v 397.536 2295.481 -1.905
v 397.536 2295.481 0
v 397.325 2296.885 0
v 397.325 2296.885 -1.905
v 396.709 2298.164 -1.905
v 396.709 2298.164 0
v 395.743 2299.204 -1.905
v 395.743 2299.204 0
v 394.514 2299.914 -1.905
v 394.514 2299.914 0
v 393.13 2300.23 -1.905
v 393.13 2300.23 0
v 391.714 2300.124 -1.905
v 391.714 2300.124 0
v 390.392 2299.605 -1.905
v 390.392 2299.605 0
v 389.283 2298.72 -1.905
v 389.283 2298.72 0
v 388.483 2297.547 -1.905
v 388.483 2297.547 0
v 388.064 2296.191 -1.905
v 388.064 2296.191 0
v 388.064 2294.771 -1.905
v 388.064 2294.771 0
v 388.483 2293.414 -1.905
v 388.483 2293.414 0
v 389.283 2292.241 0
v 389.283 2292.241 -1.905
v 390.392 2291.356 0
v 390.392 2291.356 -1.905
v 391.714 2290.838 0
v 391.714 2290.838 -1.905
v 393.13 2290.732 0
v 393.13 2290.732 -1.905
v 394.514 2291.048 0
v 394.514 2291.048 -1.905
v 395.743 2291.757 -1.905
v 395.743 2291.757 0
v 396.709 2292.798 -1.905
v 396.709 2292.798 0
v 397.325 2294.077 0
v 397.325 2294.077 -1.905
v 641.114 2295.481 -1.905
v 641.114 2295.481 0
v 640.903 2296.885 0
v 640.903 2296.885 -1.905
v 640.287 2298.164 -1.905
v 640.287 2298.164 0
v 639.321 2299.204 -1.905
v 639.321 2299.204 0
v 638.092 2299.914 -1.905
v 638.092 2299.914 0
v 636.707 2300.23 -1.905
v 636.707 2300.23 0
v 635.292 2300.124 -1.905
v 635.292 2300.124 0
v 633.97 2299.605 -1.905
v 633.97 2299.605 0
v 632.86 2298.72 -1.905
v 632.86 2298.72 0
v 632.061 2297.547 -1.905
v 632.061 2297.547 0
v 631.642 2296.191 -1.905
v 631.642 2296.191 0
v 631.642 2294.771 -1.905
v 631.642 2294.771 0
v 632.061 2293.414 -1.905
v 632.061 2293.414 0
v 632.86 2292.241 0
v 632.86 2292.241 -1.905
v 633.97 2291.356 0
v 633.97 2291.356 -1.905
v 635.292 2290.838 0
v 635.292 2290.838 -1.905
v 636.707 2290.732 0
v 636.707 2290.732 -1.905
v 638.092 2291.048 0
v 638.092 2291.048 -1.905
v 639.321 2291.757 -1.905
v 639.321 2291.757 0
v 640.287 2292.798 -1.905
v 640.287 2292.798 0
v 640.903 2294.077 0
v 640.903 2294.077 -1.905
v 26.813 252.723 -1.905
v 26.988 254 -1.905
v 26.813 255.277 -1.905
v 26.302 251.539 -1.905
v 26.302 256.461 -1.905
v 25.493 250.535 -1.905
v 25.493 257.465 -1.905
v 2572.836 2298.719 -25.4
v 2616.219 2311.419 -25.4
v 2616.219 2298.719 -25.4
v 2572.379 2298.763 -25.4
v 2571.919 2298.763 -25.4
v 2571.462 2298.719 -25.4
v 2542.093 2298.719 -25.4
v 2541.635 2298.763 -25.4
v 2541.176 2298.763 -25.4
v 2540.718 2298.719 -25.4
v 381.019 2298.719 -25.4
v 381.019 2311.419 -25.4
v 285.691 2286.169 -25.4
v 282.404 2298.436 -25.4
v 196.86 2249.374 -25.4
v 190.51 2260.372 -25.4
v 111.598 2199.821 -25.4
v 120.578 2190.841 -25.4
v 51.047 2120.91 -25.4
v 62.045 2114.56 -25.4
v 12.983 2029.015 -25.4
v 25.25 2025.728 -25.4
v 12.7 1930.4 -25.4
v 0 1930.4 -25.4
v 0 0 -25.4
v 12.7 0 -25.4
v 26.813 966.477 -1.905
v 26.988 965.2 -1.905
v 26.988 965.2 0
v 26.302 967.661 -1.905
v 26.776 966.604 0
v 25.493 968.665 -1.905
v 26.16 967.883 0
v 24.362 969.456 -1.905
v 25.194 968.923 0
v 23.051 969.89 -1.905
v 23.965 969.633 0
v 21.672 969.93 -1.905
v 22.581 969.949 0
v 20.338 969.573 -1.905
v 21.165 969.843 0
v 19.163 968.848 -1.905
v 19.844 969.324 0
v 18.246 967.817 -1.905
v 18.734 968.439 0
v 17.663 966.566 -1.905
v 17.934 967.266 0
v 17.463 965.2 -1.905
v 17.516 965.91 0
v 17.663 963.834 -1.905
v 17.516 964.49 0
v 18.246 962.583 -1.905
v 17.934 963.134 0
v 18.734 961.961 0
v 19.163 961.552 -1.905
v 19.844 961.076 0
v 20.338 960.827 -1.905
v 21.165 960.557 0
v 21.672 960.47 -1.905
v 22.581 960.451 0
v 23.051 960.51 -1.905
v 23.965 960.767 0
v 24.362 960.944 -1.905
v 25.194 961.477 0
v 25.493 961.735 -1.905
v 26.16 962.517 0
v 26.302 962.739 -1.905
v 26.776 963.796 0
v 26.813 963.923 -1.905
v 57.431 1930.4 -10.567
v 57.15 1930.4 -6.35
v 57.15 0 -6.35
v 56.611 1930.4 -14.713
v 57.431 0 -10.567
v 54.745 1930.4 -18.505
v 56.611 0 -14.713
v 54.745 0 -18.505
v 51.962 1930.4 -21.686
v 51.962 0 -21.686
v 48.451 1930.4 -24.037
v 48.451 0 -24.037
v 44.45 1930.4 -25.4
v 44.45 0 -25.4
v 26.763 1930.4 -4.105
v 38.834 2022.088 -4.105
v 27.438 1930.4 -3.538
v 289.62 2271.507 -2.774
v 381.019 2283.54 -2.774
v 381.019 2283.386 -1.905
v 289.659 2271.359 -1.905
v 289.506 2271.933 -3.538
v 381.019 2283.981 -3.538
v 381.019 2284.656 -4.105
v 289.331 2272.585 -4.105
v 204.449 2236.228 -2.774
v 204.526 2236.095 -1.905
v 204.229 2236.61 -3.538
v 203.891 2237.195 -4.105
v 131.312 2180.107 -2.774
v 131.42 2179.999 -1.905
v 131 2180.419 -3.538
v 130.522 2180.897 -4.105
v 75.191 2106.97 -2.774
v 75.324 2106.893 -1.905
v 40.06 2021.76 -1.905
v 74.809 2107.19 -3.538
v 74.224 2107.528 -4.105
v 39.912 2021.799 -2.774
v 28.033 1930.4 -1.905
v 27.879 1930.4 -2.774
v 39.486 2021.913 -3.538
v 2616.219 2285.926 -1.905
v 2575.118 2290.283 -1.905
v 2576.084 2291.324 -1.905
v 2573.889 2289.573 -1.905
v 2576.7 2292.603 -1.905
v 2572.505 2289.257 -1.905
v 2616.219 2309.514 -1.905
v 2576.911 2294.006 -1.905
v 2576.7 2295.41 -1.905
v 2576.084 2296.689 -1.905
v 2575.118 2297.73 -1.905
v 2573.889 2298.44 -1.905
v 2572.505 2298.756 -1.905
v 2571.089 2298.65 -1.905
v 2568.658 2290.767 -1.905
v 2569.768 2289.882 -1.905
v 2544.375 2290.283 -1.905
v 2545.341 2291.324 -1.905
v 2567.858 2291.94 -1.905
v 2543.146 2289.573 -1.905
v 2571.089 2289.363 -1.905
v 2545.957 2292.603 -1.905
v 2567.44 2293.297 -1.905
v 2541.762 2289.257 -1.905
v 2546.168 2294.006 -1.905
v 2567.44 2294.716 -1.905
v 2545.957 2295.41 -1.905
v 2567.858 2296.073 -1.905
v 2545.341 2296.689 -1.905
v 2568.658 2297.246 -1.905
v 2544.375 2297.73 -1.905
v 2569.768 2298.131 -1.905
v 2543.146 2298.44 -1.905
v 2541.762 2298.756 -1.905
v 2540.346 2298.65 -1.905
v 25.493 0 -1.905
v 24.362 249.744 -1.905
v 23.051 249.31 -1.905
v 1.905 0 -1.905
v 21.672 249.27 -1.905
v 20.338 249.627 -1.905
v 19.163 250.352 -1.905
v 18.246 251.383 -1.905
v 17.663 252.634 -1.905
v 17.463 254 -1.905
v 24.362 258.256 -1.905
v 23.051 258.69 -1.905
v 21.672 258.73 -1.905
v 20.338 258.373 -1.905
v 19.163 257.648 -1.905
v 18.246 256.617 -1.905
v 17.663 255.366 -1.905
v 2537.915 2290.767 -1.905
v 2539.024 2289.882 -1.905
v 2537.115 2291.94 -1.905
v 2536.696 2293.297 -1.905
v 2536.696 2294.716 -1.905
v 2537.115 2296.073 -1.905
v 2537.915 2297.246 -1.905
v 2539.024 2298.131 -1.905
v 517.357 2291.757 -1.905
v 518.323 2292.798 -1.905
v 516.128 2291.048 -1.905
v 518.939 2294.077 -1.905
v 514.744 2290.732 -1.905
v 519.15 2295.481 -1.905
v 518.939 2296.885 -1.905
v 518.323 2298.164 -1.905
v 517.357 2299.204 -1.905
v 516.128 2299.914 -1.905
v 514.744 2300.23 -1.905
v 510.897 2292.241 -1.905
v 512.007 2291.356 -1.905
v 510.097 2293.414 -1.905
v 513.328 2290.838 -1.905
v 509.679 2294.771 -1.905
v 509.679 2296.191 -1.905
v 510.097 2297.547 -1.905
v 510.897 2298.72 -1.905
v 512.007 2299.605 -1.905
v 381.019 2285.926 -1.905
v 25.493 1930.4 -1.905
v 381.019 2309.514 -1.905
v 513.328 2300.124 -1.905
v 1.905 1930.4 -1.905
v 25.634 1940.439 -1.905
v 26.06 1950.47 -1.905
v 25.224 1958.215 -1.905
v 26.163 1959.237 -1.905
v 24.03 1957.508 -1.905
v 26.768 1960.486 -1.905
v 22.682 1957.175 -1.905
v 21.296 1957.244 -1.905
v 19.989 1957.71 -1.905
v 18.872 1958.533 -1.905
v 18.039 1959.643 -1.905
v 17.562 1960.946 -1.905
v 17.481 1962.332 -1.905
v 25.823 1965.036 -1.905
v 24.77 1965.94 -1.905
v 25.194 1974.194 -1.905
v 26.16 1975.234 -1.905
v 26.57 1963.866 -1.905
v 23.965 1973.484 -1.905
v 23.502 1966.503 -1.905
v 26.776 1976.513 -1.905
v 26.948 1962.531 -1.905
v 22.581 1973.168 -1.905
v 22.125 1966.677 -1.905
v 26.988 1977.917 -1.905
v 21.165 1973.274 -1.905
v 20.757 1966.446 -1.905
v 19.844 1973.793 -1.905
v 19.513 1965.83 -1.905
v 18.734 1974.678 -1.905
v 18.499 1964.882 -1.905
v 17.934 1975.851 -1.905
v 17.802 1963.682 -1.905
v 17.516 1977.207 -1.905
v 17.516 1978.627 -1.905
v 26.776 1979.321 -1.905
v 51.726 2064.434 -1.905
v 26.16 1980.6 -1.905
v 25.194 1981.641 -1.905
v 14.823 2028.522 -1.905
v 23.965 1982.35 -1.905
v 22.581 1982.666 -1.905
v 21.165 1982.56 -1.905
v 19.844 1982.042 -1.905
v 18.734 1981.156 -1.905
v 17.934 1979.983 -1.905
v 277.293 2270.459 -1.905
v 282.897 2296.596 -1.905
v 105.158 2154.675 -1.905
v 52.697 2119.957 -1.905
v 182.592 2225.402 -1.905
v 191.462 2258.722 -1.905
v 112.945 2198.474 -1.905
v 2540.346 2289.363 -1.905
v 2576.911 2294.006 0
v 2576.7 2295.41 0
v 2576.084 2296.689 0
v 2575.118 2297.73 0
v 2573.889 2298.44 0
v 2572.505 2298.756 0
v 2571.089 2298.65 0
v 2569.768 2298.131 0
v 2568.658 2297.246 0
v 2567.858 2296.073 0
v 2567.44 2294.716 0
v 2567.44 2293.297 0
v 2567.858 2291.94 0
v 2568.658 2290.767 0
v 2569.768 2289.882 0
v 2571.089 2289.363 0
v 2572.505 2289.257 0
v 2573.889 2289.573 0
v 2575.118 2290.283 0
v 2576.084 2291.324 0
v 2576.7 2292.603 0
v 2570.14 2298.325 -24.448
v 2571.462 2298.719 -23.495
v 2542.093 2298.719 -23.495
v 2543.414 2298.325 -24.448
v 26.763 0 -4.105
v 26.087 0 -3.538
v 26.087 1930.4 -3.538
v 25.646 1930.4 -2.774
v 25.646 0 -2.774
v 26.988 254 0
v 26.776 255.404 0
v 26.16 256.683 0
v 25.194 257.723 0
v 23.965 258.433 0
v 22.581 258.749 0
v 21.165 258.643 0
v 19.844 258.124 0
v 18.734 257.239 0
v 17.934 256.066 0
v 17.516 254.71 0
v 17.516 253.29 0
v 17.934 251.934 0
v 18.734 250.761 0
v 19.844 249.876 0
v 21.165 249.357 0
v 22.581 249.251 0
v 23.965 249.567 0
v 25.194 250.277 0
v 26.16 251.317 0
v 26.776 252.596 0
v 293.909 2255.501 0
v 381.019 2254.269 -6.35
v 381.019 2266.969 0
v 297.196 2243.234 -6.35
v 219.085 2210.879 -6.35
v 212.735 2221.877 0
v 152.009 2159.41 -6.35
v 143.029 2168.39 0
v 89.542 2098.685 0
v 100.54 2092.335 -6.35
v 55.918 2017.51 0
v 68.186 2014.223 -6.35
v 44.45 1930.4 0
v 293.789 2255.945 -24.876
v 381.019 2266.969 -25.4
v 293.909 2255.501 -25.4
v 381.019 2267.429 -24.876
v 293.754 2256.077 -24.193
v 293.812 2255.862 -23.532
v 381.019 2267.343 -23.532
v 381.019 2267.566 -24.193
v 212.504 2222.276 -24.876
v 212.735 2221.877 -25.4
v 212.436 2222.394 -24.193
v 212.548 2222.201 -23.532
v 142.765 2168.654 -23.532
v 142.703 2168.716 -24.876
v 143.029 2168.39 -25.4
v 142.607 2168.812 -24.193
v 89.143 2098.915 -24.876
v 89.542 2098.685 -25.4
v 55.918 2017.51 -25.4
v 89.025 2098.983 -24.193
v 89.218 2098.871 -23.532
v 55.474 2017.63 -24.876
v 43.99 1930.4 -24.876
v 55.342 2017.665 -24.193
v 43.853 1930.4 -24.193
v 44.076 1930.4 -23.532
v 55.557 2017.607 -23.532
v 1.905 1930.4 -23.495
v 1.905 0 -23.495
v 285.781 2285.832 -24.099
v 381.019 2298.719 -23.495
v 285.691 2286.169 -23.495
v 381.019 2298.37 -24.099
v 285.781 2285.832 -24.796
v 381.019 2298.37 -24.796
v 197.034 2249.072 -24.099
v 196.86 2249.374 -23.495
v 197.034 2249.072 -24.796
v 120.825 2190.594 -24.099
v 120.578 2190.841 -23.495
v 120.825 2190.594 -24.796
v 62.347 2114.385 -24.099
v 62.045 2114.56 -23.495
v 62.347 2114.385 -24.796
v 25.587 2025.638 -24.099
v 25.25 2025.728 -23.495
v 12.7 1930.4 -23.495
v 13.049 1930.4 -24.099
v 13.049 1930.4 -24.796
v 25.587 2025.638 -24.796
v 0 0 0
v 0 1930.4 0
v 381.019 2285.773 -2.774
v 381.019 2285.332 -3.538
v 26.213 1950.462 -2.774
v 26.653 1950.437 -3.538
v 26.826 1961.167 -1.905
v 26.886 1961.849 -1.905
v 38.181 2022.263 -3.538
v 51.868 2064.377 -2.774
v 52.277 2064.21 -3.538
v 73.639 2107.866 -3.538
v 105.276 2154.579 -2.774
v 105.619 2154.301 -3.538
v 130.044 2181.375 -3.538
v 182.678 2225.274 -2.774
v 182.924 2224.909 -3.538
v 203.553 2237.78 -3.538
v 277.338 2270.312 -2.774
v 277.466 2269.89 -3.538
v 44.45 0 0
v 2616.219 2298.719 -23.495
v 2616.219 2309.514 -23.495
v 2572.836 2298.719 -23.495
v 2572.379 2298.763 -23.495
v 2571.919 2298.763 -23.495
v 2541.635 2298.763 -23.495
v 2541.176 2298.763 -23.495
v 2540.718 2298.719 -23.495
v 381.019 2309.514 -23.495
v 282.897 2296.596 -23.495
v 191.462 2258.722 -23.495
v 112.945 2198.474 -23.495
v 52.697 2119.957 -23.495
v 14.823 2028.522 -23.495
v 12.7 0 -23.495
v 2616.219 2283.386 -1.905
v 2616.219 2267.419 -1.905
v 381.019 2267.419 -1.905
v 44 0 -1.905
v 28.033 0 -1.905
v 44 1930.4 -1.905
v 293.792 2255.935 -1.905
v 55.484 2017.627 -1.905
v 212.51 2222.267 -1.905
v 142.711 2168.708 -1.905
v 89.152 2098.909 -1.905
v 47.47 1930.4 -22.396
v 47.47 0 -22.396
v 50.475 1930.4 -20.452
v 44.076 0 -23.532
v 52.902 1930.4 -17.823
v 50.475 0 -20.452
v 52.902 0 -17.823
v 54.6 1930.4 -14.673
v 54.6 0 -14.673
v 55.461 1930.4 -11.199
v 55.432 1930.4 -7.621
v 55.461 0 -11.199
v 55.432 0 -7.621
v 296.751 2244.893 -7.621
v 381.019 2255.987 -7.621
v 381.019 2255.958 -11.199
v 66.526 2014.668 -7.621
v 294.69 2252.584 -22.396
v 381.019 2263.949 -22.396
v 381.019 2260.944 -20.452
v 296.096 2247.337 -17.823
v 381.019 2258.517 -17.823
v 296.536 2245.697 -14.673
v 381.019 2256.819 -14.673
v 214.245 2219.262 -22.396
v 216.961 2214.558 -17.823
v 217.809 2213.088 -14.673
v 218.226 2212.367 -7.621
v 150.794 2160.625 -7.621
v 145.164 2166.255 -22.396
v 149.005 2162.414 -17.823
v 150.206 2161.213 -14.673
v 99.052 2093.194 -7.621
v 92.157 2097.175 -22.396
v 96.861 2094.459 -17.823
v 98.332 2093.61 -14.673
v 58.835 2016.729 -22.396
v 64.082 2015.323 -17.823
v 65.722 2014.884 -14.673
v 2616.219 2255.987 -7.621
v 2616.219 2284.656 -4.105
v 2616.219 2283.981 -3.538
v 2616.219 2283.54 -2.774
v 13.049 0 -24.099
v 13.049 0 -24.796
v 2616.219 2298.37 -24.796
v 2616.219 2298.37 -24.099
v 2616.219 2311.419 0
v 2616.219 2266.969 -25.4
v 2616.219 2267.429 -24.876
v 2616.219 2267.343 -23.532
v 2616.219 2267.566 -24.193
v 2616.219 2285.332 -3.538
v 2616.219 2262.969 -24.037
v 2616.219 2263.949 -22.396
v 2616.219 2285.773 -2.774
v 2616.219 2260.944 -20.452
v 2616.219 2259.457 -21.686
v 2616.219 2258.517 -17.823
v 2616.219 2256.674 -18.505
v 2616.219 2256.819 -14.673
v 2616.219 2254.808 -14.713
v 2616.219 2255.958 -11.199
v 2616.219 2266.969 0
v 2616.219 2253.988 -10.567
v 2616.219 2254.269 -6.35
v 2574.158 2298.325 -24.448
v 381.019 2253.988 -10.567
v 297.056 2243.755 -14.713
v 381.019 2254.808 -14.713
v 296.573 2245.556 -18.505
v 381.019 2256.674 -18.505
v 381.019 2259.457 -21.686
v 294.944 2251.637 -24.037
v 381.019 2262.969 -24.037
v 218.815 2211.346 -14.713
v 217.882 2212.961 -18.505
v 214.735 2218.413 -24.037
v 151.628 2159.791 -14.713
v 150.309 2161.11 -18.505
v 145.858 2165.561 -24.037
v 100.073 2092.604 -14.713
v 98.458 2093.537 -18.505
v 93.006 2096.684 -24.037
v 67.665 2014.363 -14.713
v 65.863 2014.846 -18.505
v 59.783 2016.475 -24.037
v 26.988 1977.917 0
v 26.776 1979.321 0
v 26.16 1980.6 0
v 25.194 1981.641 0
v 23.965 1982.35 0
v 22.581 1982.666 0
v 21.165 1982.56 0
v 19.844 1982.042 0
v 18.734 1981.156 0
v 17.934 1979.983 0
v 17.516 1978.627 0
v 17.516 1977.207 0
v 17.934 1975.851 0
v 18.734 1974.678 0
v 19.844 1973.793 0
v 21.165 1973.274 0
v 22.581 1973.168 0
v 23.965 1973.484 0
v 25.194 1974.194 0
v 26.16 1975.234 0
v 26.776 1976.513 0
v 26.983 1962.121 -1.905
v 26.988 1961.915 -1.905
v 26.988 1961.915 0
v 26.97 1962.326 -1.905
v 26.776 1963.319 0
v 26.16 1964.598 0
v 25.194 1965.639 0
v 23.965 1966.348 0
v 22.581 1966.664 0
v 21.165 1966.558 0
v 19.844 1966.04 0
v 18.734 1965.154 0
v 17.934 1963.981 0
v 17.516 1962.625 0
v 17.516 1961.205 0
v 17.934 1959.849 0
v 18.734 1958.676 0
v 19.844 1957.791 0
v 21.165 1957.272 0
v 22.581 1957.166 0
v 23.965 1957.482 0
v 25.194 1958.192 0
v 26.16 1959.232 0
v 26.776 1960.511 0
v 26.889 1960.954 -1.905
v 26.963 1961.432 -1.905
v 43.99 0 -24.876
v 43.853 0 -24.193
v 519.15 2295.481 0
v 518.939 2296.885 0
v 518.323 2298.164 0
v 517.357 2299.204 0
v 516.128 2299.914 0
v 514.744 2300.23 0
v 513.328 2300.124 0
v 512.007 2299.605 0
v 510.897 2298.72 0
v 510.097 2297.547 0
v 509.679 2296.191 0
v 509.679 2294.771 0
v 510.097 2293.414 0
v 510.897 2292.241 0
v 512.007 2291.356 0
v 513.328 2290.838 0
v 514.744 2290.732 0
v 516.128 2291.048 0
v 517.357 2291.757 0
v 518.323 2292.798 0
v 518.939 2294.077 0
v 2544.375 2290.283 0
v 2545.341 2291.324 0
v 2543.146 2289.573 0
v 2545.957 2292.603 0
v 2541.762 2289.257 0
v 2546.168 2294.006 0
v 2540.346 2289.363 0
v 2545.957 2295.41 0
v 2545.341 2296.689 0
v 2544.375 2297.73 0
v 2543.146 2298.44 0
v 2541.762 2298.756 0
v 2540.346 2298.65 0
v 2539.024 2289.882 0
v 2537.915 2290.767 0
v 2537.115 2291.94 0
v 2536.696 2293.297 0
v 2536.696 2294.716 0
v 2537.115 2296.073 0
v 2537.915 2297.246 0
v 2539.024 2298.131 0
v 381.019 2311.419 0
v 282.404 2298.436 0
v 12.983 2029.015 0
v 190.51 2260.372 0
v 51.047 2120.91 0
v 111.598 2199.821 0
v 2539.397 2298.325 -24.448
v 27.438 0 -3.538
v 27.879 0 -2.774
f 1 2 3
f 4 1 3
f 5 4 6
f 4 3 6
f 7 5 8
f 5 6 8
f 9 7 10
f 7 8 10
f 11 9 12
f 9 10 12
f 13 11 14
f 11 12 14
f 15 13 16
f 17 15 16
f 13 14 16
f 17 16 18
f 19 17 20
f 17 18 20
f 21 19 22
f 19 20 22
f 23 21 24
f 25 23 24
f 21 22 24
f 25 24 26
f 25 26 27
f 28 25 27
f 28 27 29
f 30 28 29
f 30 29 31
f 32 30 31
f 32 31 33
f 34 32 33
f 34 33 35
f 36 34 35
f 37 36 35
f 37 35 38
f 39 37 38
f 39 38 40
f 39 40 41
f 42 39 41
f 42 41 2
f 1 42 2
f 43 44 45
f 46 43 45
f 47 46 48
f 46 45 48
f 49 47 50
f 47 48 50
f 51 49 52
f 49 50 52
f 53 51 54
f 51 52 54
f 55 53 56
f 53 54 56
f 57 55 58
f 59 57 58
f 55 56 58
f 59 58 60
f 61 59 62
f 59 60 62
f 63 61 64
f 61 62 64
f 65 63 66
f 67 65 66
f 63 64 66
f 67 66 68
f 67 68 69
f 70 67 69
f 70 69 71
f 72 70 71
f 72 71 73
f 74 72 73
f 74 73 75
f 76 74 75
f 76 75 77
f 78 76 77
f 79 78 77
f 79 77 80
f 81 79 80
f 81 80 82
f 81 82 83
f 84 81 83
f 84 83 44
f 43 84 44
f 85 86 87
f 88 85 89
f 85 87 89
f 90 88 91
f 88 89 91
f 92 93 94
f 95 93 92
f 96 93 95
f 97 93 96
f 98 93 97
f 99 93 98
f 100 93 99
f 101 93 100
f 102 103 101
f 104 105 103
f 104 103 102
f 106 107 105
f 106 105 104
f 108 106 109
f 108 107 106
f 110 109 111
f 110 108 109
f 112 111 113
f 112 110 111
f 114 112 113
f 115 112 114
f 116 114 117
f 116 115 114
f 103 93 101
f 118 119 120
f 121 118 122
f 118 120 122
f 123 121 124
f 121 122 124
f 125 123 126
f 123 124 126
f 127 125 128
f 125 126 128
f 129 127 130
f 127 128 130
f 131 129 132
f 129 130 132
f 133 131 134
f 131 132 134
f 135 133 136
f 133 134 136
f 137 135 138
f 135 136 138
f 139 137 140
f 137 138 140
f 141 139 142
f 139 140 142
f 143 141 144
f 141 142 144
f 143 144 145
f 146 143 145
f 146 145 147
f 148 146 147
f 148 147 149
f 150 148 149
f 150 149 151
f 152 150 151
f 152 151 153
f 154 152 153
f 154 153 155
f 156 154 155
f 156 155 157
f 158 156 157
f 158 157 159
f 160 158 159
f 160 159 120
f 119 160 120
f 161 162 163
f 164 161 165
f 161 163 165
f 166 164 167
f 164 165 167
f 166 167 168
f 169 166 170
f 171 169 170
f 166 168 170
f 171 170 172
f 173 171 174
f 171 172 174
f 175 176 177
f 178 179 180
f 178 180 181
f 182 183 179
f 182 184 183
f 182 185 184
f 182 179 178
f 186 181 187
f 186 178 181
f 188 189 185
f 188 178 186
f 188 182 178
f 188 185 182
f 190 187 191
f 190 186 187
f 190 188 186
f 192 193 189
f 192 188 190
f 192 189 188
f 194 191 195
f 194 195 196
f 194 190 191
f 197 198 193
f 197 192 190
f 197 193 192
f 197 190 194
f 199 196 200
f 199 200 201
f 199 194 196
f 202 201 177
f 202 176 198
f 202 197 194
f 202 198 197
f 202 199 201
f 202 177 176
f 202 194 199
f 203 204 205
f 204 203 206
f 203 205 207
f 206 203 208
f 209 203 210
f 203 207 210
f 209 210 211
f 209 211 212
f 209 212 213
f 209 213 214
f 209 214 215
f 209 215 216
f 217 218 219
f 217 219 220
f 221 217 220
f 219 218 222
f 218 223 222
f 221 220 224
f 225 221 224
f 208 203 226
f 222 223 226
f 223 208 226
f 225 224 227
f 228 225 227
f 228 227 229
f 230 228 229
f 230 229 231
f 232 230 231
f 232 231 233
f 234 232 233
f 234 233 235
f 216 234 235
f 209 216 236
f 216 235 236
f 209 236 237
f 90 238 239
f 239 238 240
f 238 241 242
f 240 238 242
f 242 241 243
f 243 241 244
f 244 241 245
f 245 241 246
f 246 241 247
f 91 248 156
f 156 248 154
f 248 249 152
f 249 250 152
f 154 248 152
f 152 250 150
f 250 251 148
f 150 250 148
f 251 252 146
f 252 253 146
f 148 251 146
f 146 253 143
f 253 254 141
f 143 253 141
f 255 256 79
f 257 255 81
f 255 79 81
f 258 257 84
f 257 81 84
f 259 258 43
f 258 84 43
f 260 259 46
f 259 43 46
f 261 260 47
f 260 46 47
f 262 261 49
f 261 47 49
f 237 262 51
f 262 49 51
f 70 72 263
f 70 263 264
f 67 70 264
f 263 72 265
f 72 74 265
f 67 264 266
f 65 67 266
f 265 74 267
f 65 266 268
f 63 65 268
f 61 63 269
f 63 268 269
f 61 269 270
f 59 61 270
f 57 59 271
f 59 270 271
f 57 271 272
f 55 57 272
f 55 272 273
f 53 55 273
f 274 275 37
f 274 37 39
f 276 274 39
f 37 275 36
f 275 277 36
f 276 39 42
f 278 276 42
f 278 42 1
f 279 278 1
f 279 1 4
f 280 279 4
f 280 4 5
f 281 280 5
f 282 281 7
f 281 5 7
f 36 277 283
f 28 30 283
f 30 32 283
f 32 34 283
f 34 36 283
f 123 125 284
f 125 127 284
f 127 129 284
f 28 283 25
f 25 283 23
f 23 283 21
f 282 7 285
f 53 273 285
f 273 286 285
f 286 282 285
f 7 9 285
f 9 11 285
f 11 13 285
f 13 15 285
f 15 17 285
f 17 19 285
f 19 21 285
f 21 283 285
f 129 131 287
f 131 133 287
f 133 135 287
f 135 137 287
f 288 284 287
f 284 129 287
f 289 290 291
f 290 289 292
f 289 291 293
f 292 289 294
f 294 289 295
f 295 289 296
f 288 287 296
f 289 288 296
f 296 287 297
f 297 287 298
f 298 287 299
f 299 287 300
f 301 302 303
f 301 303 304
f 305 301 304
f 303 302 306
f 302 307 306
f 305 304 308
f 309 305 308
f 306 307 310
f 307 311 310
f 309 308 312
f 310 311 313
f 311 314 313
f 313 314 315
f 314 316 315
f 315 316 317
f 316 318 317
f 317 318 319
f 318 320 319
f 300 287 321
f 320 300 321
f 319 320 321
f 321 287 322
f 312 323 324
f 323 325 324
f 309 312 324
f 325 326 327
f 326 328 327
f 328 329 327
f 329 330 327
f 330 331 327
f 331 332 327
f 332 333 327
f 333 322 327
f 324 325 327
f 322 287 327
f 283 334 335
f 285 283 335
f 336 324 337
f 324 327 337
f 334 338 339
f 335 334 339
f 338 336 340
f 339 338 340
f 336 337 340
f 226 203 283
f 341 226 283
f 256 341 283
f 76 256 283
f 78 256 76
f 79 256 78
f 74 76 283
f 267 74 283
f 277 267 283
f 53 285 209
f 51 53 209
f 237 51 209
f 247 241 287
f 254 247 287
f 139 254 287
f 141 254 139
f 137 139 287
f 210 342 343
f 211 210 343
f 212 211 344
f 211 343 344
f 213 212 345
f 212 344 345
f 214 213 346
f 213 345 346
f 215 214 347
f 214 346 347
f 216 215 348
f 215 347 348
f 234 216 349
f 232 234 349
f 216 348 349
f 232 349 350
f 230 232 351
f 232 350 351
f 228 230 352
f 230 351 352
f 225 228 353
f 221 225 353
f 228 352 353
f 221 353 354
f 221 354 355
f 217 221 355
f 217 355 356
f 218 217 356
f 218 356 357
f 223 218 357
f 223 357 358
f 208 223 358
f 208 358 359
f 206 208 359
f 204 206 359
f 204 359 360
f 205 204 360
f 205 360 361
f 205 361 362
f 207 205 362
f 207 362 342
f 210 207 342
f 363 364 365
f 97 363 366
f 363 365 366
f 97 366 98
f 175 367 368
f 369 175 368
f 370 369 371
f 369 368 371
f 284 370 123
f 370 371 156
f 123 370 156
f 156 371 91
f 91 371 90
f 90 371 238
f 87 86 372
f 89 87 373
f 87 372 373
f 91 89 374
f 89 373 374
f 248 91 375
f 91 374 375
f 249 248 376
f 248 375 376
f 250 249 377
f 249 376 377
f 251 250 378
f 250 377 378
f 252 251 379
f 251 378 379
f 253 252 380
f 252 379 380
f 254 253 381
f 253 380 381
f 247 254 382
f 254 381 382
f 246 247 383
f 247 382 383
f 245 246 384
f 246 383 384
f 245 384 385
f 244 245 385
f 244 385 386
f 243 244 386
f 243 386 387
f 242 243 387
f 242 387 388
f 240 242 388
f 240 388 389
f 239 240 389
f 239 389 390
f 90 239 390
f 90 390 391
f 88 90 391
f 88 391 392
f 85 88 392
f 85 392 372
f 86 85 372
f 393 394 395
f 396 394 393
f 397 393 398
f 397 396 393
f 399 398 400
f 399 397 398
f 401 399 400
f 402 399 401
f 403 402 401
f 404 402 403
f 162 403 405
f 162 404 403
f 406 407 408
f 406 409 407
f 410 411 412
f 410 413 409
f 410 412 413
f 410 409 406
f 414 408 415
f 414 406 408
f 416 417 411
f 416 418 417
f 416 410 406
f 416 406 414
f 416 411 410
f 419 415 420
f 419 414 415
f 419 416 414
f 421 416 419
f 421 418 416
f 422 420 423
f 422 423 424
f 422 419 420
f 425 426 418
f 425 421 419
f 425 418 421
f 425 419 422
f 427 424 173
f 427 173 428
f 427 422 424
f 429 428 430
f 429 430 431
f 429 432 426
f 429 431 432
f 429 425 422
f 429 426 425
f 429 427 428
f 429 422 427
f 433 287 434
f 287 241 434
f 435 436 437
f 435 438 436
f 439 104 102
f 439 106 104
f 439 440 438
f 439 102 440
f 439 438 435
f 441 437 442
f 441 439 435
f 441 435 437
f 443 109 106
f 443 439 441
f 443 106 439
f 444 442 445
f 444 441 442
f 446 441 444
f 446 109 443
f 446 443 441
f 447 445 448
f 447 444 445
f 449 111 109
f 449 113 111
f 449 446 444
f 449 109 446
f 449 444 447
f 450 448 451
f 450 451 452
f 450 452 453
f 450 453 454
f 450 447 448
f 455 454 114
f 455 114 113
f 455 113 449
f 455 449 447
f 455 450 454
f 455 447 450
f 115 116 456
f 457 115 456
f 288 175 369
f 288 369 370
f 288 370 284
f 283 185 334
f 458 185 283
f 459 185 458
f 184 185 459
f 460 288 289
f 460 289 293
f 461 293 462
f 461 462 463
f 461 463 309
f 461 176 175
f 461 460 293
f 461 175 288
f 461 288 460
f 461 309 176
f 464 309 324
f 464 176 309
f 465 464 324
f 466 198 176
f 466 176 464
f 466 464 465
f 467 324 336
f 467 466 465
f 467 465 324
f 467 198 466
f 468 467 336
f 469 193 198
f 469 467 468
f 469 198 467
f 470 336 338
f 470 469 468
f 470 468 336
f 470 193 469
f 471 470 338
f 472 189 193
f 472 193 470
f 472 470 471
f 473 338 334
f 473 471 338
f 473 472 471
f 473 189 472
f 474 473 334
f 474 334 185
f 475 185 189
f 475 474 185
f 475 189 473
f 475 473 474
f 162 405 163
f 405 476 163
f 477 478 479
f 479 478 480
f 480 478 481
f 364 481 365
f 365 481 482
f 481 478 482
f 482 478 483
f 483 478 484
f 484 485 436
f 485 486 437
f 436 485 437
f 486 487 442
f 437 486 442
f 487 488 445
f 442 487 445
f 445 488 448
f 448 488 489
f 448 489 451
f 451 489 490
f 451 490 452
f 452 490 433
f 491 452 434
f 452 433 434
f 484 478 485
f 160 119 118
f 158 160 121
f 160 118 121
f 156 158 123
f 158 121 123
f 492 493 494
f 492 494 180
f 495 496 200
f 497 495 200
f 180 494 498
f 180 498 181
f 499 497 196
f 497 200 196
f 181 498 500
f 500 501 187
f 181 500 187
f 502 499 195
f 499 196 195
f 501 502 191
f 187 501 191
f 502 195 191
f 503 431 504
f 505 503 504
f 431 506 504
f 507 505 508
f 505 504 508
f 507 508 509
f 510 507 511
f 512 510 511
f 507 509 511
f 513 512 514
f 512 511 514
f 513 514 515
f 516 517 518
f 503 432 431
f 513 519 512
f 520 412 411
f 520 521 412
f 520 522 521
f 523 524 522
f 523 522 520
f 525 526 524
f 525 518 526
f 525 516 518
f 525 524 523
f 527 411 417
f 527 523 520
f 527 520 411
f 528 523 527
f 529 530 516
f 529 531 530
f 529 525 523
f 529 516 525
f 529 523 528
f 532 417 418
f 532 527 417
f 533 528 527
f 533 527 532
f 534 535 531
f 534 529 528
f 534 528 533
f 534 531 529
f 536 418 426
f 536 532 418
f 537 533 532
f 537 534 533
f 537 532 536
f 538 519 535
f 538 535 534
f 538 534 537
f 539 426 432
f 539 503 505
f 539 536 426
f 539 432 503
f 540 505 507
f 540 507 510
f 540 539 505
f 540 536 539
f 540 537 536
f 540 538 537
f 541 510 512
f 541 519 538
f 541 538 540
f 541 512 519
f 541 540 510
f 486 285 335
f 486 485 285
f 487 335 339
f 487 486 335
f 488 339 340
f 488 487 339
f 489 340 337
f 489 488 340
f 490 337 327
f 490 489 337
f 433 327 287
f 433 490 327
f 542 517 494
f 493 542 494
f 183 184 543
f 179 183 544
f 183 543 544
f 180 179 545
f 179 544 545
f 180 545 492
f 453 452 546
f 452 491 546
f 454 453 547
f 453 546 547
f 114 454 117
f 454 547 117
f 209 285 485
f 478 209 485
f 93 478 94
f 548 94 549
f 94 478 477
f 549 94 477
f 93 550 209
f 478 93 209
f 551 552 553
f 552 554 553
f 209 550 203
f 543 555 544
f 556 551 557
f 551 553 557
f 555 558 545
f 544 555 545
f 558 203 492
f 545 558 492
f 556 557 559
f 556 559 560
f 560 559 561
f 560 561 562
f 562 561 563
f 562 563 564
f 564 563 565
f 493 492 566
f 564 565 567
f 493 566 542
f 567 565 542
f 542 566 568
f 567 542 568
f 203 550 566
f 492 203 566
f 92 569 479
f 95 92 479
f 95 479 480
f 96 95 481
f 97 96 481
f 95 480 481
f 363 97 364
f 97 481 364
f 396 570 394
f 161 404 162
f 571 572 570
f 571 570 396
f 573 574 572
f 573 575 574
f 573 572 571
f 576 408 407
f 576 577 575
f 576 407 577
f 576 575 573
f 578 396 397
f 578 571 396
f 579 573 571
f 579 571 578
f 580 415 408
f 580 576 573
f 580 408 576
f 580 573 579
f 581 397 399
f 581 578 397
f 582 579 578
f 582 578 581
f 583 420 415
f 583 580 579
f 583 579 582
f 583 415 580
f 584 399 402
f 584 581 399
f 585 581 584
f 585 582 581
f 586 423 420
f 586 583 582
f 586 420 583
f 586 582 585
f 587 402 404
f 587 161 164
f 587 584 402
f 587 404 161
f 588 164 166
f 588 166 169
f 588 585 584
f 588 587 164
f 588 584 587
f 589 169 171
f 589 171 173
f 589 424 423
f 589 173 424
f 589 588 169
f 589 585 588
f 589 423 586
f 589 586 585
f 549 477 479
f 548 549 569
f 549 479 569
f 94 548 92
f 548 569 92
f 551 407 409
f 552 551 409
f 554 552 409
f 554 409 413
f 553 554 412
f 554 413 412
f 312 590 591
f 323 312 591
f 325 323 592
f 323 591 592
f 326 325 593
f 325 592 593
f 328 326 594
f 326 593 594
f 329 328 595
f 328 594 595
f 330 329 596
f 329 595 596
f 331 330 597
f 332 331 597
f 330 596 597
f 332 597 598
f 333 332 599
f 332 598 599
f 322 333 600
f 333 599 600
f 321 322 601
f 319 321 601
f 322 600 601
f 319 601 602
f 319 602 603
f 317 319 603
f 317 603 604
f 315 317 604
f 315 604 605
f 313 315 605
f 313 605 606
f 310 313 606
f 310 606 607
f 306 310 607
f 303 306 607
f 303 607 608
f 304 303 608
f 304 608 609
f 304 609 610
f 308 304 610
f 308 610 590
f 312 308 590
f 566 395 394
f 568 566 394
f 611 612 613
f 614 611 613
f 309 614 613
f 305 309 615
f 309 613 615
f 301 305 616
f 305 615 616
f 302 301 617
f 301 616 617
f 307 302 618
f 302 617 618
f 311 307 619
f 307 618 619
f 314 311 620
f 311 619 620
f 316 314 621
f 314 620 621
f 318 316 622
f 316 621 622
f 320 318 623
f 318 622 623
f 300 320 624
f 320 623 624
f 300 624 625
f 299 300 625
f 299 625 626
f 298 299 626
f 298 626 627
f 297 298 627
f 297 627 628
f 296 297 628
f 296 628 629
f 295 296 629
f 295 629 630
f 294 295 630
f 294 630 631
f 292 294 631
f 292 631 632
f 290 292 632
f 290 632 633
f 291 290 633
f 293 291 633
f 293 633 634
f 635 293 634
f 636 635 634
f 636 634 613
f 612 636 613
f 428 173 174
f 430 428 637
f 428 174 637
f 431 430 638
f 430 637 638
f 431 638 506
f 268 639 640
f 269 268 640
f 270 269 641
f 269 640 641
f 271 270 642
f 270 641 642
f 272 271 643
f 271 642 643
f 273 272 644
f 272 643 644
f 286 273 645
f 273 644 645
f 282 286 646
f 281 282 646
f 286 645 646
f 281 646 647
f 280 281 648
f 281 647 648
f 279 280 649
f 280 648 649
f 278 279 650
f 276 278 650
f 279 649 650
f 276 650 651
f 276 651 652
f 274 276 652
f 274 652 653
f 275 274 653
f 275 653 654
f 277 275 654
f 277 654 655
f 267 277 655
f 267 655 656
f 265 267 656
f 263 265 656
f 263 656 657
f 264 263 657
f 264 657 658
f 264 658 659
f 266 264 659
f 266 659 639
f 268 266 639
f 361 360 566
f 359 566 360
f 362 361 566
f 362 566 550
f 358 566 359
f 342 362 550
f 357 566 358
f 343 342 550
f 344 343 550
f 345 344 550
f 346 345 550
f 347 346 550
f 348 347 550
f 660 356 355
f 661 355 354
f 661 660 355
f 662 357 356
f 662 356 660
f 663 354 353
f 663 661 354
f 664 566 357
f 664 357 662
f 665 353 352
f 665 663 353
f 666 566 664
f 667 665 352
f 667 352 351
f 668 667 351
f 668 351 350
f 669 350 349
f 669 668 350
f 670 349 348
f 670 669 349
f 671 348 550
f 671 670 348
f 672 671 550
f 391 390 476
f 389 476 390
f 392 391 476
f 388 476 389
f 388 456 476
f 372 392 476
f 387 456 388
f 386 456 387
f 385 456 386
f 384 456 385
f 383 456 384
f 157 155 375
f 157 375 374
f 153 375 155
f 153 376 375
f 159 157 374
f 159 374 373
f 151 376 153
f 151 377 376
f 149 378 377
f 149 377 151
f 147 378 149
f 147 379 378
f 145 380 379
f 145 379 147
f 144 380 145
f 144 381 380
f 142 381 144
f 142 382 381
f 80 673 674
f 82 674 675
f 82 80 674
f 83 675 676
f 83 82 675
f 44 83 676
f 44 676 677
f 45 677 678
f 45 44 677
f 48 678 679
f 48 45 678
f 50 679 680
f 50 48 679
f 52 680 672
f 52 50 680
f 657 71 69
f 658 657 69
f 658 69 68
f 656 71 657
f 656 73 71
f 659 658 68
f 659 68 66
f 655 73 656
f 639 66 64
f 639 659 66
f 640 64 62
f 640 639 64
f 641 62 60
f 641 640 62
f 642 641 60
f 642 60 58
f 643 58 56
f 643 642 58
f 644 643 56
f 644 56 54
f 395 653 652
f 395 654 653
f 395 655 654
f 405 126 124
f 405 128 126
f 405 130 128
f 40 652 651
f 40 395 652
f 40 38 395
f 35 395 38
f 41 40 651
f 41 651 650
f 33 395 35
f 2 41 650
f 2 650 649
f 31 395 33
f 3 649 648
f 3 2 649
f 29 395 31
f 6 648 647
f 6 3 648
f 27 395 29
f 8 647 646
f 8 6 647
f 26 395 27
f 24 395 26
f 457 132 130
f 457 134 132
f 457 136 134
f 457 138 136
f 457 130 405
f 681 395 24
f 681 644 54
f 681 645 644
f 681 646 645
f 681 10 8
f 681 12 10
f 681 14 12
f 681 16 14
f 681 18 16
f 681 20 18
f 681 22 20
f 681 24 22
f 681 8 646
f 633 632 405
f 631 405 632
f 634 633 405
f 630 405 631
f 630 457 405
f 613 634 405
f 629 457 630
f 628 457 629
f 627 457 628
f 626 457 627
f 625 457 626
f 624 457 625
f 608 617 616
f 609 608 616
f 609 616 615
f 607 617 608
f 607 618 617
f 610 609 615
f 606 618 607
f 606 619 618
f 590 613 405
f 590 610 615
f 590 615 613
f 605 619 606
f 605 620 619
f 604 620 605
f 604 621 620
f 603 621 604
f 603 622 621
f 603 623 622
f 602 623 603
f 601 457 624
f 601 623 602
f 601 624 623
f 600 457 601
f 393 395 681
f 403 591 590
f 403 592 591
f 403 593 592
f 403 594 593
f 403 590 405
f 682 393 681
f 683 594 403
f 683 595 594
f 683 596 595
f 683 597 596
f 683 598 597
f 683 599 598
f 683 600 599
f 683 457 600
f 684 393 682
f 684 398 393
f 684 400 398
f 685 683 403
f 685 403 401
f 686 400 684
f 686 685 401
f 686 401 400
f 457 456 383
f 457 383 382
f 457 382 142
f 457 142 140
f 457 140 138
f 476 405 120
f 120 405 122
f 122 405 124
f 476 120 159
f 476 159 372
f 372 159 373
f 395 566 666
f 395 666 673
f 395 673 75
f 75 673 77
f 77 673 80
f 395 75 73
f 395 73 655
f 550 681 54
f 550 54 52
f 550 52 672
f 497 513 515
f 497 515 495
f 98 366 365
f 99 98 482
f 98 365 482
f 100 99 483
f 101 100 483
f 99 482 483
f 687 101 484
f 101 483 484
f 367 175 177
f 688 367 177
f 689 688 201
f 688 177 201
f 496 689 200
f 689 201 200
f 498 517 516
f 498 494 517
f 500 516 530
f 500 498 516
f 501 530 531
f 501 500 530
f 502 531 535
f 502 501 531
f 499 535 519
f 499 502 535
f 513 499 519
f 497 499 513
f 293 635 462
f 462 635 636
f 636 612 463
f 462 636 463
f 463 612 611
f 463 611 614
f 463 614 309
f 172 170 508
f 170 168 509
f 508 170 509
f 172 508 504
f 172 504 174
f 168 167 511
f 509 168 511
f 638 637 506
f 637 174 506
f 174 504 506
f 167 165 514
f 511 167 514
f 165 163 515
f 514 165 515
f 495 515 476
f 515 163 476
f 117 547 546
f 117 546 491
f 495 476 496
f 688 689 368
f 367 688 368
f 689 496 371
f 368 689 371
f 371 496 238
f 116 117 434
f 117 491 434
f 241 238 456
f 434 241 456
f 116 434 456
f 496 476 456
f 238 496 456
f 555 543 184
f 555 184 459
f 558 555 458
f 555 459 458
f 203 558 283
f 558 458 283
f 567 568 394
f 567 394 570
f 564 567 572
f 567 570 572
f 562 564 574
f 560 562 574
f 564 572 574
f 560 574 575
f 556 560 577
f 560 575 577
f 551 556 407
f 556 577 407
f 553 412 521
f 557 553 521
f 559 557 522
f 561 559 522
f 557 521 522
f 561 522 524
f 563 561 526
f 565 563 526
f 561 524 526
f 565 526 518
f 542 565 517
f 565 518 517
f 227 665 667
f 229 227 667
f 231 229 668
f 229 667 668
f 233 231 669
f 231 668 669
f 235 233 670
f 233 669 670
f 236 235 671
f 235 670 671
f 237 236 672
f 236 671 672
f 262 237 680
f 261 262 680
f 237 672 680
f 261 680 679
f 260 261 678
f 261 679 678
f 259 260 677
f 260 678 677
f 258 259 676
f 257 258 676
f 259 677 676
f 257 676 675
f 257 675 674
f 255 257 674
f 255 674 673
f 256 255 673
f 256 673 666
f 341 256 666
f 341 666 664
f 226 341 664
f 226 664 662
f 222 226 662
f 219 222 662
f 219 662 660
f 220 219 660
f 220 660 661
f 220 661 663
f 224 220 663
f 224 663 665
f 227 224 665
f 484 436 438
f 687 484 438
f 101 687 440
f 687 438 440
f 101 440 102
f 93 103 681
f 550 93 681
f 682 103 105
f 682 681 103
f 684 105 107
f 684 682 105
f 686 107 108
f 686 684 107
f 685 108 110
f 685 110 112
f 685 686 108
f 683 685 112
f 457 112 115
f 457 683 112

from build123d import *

# Parameters (mm, degrees)
BOSS_EXTRUDE1_DEPTH = 2.54
SWEEP1_START        = 2.54
SWEEP1_DEPTH        = 1927.86
SWEEP1_START_2      = 381.019111525
SWEEP1_2_DEPTH      = 2235.2
SWEEP1_3_ANGLE      = 90
CUT_EXTRUDE1_REACH  = 3493.118
SKETCH4_R           = 4.7625
CUT_EXTRUDE2_REACH  = 3493.118
SKETCH5_R           = 4.7625
BOSS_EXTRUDE2_DEPTH = 2.54
FILLET1_R           = 2.54
SKETCH7_R           = 4.7625
CUT_EXTRUDE3_DEPTH  = 3492.1181459


with BuildPart() as part:
    # Sketch2 → Boss-Extrude1 (new body)
    with BuildSketch(Plane(origin=(0, 0, 0), x_dir=(1, 0, 0), z_dir=(0, 1, 0))):
        with BuildLine():
            Line((0, 25.4), (12.7, 25.4))
            ThreePointArc((12.7, 25.4), (13.094538418, 24.4475), (12.7, 23.495))
            Line((12.7, 23.495), (1.905, 23.495))
            Line((1.905, 23.495), (1.905, 1.905))
            Line((1.905, 1.905), (34.925, 1.905))
            Line((34.925, 1.905), (44.000290503, 1.905))
            Line((44.000290503, 1.905), (55.431897483, 7.62080349))
            ThreePointArc((55.431897483, 7.62080349), (52.902013686, 17.822967428), (44.076398763, 23.531993813))
            ThreePointArc((44.076398763, 23.531993813), (43.876322633, 24.543372256), (44.45, 25.4))
            ThreePointArc((44.45, 25.4), (54.745384182, 18.505256121), (57.15, 6.35))
            Line((57.15, 6.35), (44.45, 0))
            Line((44.45, 0), (34.925, 0))
            Line((34.925, 0), (0, 0))
            Line((0, 0), (0, 25.4))
        make_face()
    extrude(amount=BOSS_EXTRUDE1_DEPTH)

    # Sweep1: read off the stored shape, not the designer's step
    # Sweep1 outline → Sweep1 (add)
    with BuildSketch(Plane(origin=(0, 0, 0), x_dir=(1, 0, 0), z_dir=(0, 1, 0)).offset(SWEEP1_START)):
        with BuildLine():
            Line((0, 0), (44.45, 0))
            Line((44.45, 0), (57.15, 6.35))
            ThreePointArc((57.15, 6.35), (54.745384182, 18.505256121), (44.45, 25.4))
            ThreePointArc((44.45, 25.4), (43.876322633, 24.543372256), (44.076398763, 23.531993813))
            ThreePointArc((44.076398763, 23.531993813), (52.902013686, 17.822967428), (55.431897483, 7.62080349))
            Line((55.431897483, 7.62080349), (44.000290503, 1.905))
            Line((44.000290503, 1.905), (1.905, 1.905))
            Line((1.905, 1.905), (1.905, 23.495))
            Line((1.905, 23.495), (12.7, 23.495))
            ThreePointArc((12.7, 23.495), (13.094538418, 24.4475), (12.7, 25.4))
            Line((12.7, 25.4), (0, 25.4))
            Line((0, 25.4), (0, 0))
        make_face()
    extrude(amount=SWEEP1_DEPTH)



with BuildPart() as body_2:
    # Sweep1 2 outline → Sweep1 2 (new body)
    with BuildSketch(Plane.YZ.offset(SWEEP1_START_2)):
        with BuildLine():
            Line((2311.419111525, -25.4), (2311.419111525, 0))
            Line((2311.419111525, 0), (2266.969111525, 0))
            Line((2266.969111525, 0), (2254.269111525, -6.35))
            ThreePointArc((2254.269111525, -6.35), (2256.673727343, -18.505256121), (2266.969111525, -25.4))
            ThreePointArc((2266.969111525, -25.4), (2267.542788892, -24.543372256), (2267.342712762, -23.531993813))
            ThreePointArc((2267.342712762, -23.531993813), (2258.517097838, -17.822967428), (2255.987214041, -7.62080349))
            Line((2255.987214041, -7.62080349), (2267.418821022, -1.905))
            Line((2267.418821022, -1.905), (2309.514111525, -1.905))
            Line((2309.514111525, -1.905), (2309.514111525, -23.495))
            Line((2309.514111525, -23.495), (2298.719111525, -23.495))
            ThreePointArc((2298.719111525, -23.495), (2298.324573106, -24.4475), (2298.719111525, -25.4))
            Line((2298.719111525, -25.4), (2311.419111525, -25.4))
        make_face()
    extrude(amount=SWEEP1_2_DEPTH)


with BuildPart() as part_1:
    add(part.part)

    add(body_2.part)  # Sweep1 3 merges body 2
    # Sweep1 3 outline → Sweep1 3 (revolve)
    with BuildSketch(Plane(origin=(381.019111525, 1930.4, 0), x_dir=(0, 1, 0), z_dir=(1, 0, 0))):
        with BuildLine():
            Line((336.569111525, 0), (323.869111525, -6.35))
            ThreePointArc((323.869111525, -6.35), (326.273727343, -18.505256121), (336.569111525, -25.4))
            ThreePointArc((336.569111525, -25.4), (337.142788892, -24.543372256), (336.942712762, -23.531993813))
            ThreePointArc((336.942712762, -23.531993813), (328.117097838, -17.822967428), (325.587214041, -7.62080349))
            Line((325.587214041, -7.62080349), (337.018821022, -1.905))
            Line((337.018821022, -1.905), (379.114111525, -1.905))
            Line((379.114111525, -1.905), (379.114111525, -23.495))
            Line((379.114111525, -23.495), (368.319111525, -23.495))
            ThreePointArc((368.319111525, -23.495), (367.924573106, -24.4475), (368.319111525, -25.4))
            Line((368.319111525, -25.4), (381.019111525, -25.4))
            Line((381.019111525, -25.4), (381.019111525, 0))
            Line((381.019111525, 0), (336.569111525, 0))
        make_face()
    revolve(axis=Axis((381.019111525, 1930.4, 0), (0, 0, 1)), revolution_arc=SWEEP1_3_ANGLE)

    # Sketch4 → Cut-Extrude1 (cut, up to next)
    with BuildSketch(Plane.XY, mode=Mode.PRIVATE) as cut_extrude1_sk1:
        with Locations((22.225, 254)):
            Circle(SKETCH4_R)
    cut_extrude1_tool1 = extrude(cut_extrude1_sk1.sketch, amount=-CUT_EXTRUDE1_REACH, mode=Mode.PRIVATE) & part_1.part
    # Sketch4 → Cut-Extrude1 (cut, up to next)
    with BuildSketch(Plane.XY, mode=Mode.PRIVATE) as cut_extrude1_sk2:
        with Locations((22.225, 965.2)):
            Circle(SKETCH4_R)
    cut_extrude1_tool2 = extrude(cut_extrude1_sk2.sketch, amount=-CUT_EXTRUDE1_REACH, mode=Mode.PRIVATE) & part_1.part
    # Sketch4 → Cut-Extrude1 (cut, up to next)
    with BuildSketch(Plane.XY, mode=Mode.PRIVATE) as cut_extrude1_sk3:
        with Locations((22.225, 1977.917111525)):
            Circle(SKETCH4_R)
    cut_extrude1_tool3 = extrude(cut_extrude1_sk3.sketch, amount=-CUT_EXTRUDE1_REACH, mode=Mode.PRIVATE) & part_1.part
    # Sketch4 → Cut-Extrude1 (cut, up to next)
    with BuildSketch(Plane.XY, mode=Mode.PRIVATE) as cut_extrude1_sk4:
        with Locations((22.225, 1961.915111525)):
            Circle(SKETCH4_R)
    cut_extrude1_tool4 = extrude(cut_extrude1_sk4.sketch, amount=-CUT_EXTRUDE1_REACH, mode=Mode.PRIVATE) & part_1.part
    add(cut_extrude1_tool1.solids().sort_by_distance((22.225, 254, 0))[0], mode=Mode.SUBTRACT)
    add(cut_extrude1_tool2.solids().sort_by_distance((22.225, 965.2, 0))[0], mode=Mode.SUBTRACT)
    add(cut_extrude1_tool3.solids().sort_by_distance((22.225, 1977.917112, 0))[0], mode=Mode.SUBTRACT)
    add(cut_extrude1_tool4.solids().sort_by_distance((22.225, 1961.915112, 0))[0], mode=Mode.SUBTRACT)

    # Sketch5 → Cut-Extrude2 (cut, up to next)
    with BuildSketch(Plane.XY, mode=Mode.PRIVATE) as cut_extrude2_sk1:
        with Locations((392.773679289, 2295.48078944)):
            Circle(SKETCH5_R)
    cut_extrude2_tool1 = extrude(cut_extrude2_sk1.sketch, amount=-CUT_EXTRUDE2_REACH, mode=Mode.PRIVATE) & part_1.part
    # Sketch5 → Cut-Extrude2 (cut, up to next)
    with BuildSketch(Plane.XY, mode=Mode.PRIVATE) as cut_extrude2_sk2:
        with Locations((514.387968665, 2295.48078944)):
            Circle(SKETCH5_R)
    cut_extrude2_tool2 = extrude(cut_extrude2_sk2.sketch, amount=-CUT_EXTRUDE2_REACH, mode=Mode.PRIVATE) & part_1.part
    # Sketch5 → Cut-Extrude2 (cut, up to next)
    with BuildSketch(Plane.XY, mode=Mode.PRIVATE) as cut_extrude2_sk3:
        with Locations((636.351596179, 2295.48078944)):
            Circle(SKETCH5_R)
    cut_extrude2_tool3 = extrude(cut_extrude2_sk3.sketch, amount=-CUT_EXTRUDE2_REACH, mode=Mode.PRIVATE) & part_1.part
    add(cut_extrude2_tool1.solids().sort_by_distance((392.773679, 2295.480789, 0))[0], mode=Mode.SUBTRACT)
    add(cut_extrude2_tool2.solids().sort_by_distance((514.387969, 2295.480789, 0))[0], mode=Mode.SUBTRACT)
    add(cut_extrude2_tool3.solids().sort_by_distance((636.351596, 2295.480789, 0))[0], mode=Mode.SUBTRACT)

    # Sketch6 → Boss-Extrude2 (add)
    with BuildSketch(Plane(origin=(0, 0, -1.905), x_dir=(-1, 0, 0), z_dir=(0, 0, -1))):
        with BuildLine():
            Line((-2616.219111525, 2285.926466273), (-2616.219111525, 2283.386466273))
            Line((-2616.219111525, 2283.386466273), (-381.019111525, 2283.386466273))
            ThreePointArc((-381.019111525, 2283.386466273), (-131.419987556, 2179.999123969), (-28.032645251, 1930.4))
            Line((-28.032645251, 1930.4), (-28.032645251, 0))
            Line((-28.032645251, 0), (-25.492645251, 0))
            Line((-25.492645251, 0), (-25.492645251, 1930.4))
            ThreePointArc((-25.492645251, 1930.4), (-129.623936332, 2181.795175193), (-381.019111525, 2285.926466273))
            Line((-381.019111525, 2285.926466273), (-2616.219111525, 2285.926466273))
        make_face()
    extrude(amount=BOSS_EXTRUDE2_DEPTH)

    # Fillet1
    # the kernel refuses this fillet: 2.54 mm, written as the material it takes off along each edge
    with BuildSketch(Plane(origin=(25.492645251, -6.35, -4.445), x_dir=(0, 0, 1), z_dir=(0, 1, 0)), Plane(origin=(28.032645251, 1930.4, -4.445), x_dir=(0, 0, 1), z_dir=(0, -1, 0))) as fillet1_piece_1:
        with BuildLine():
            CenterArc((FILLET1_R, FILLET1_R), FILLET1_R, 180, 90)
            Line((0, FILLET1_R), (0, 0))
            Line((0, 0), (FILLET1_R, 0))
        make_face()
    extrude(amount=1936.75, mode=Mode.SUBTRACT)
    with BuildSketch(Plane(origin=(381.019111525, 1930.4, -4.445), x_dir=(-1, 0, 0), z_dir=(0, -1, 0))) as fillet1_piece_2:
        with BuildLine():
            CenterArc((355.526466273 - FILLET1_R, -FILLET1_R), FILLET1_R, 0, 90)
            Line((355.526466273, -FILLET1_R), (355.526466273, 0))
            Line((355.526466273, 0), (355.526466273 - FILLET1_R, 0))
        make_face()
    revolve(axis=Axis((381.019111525, 1930.4, -4.445), (0, 0, -1)), revolution_arc=90, mode=Mode.SUBTRACT)
    with BuildSketch(Plane(origin=(381.019111525, 1930.4, -4.445), x_dir=(0, 1, 0), z_dir=(1, 0, 0))) as fillet1_piece_3:
        with BuildLine():
            CenterArc((352.986466273 + FILLET1_R, FILLET1_R), FILLET1_R, 180, 90)
            Line((352.986466273 + FILLET1_R, 0), (352.986466273, 0))
            Line((352.986466273, 0), (352.986466273, FILLET1_R))
        make_face()
    revolve(axis=Axis((381.019111525, 1930.4, -4.445), (0, 0, 1)), revolution_arc=90, mode=Mode.SUBTRACT)
    with BuildSketch(Plane(origin=(381.019111525, 2285.926466273, -4.445), x_dir=(0, -1, 0), z_dir=(1, 0, 0))) as fillet1_piece_4:
        with BuildLine():
            CenterArc((FILLET1_R, -FILLET1_R), FILLET1_R, 90, 90)
            Line((0, -FILLET1_R), (0, 0))
            Line((0, 0), (FILLET1_R, 0))
        make_face()
    extrude(amount=2241.55, mode=Mode.SUBTRACT)
    with BuildSketch(Plane(origin=(2622.569111525, 2283.386466273, -4.445), x_dir=(0, 0, 1), z_dir=(-1, 0, 0))) as fillet1_piece_5:
        with BuildLine():
            CenterArc((FILLET1_R, FILLET1_R), FILLET1_R, 180, 90)
            Line((0, FILLET1_R), (0, 0))
            Line((0, 0), (FILLET1_R, 0))
        make_face()
    extrude(amount=2241.55, mode=Mode.SUBTRACT)

    # Sketch7 → Cut-Extrude3 (cut, through all)
    with BuildSketch(Plane.XY):
        with Locations((2572.148894219, 2294.006465832)):
            Circle(SKETCH7_R)
        with Locations((2541.405669578, 2294.006465832)):
            Circle(SKETCH7_R)
    extrude(amount=-CUT_EXTRUDE3_DEPTH, mode=Mode.SUBTRACT)


solid = part_1.part
